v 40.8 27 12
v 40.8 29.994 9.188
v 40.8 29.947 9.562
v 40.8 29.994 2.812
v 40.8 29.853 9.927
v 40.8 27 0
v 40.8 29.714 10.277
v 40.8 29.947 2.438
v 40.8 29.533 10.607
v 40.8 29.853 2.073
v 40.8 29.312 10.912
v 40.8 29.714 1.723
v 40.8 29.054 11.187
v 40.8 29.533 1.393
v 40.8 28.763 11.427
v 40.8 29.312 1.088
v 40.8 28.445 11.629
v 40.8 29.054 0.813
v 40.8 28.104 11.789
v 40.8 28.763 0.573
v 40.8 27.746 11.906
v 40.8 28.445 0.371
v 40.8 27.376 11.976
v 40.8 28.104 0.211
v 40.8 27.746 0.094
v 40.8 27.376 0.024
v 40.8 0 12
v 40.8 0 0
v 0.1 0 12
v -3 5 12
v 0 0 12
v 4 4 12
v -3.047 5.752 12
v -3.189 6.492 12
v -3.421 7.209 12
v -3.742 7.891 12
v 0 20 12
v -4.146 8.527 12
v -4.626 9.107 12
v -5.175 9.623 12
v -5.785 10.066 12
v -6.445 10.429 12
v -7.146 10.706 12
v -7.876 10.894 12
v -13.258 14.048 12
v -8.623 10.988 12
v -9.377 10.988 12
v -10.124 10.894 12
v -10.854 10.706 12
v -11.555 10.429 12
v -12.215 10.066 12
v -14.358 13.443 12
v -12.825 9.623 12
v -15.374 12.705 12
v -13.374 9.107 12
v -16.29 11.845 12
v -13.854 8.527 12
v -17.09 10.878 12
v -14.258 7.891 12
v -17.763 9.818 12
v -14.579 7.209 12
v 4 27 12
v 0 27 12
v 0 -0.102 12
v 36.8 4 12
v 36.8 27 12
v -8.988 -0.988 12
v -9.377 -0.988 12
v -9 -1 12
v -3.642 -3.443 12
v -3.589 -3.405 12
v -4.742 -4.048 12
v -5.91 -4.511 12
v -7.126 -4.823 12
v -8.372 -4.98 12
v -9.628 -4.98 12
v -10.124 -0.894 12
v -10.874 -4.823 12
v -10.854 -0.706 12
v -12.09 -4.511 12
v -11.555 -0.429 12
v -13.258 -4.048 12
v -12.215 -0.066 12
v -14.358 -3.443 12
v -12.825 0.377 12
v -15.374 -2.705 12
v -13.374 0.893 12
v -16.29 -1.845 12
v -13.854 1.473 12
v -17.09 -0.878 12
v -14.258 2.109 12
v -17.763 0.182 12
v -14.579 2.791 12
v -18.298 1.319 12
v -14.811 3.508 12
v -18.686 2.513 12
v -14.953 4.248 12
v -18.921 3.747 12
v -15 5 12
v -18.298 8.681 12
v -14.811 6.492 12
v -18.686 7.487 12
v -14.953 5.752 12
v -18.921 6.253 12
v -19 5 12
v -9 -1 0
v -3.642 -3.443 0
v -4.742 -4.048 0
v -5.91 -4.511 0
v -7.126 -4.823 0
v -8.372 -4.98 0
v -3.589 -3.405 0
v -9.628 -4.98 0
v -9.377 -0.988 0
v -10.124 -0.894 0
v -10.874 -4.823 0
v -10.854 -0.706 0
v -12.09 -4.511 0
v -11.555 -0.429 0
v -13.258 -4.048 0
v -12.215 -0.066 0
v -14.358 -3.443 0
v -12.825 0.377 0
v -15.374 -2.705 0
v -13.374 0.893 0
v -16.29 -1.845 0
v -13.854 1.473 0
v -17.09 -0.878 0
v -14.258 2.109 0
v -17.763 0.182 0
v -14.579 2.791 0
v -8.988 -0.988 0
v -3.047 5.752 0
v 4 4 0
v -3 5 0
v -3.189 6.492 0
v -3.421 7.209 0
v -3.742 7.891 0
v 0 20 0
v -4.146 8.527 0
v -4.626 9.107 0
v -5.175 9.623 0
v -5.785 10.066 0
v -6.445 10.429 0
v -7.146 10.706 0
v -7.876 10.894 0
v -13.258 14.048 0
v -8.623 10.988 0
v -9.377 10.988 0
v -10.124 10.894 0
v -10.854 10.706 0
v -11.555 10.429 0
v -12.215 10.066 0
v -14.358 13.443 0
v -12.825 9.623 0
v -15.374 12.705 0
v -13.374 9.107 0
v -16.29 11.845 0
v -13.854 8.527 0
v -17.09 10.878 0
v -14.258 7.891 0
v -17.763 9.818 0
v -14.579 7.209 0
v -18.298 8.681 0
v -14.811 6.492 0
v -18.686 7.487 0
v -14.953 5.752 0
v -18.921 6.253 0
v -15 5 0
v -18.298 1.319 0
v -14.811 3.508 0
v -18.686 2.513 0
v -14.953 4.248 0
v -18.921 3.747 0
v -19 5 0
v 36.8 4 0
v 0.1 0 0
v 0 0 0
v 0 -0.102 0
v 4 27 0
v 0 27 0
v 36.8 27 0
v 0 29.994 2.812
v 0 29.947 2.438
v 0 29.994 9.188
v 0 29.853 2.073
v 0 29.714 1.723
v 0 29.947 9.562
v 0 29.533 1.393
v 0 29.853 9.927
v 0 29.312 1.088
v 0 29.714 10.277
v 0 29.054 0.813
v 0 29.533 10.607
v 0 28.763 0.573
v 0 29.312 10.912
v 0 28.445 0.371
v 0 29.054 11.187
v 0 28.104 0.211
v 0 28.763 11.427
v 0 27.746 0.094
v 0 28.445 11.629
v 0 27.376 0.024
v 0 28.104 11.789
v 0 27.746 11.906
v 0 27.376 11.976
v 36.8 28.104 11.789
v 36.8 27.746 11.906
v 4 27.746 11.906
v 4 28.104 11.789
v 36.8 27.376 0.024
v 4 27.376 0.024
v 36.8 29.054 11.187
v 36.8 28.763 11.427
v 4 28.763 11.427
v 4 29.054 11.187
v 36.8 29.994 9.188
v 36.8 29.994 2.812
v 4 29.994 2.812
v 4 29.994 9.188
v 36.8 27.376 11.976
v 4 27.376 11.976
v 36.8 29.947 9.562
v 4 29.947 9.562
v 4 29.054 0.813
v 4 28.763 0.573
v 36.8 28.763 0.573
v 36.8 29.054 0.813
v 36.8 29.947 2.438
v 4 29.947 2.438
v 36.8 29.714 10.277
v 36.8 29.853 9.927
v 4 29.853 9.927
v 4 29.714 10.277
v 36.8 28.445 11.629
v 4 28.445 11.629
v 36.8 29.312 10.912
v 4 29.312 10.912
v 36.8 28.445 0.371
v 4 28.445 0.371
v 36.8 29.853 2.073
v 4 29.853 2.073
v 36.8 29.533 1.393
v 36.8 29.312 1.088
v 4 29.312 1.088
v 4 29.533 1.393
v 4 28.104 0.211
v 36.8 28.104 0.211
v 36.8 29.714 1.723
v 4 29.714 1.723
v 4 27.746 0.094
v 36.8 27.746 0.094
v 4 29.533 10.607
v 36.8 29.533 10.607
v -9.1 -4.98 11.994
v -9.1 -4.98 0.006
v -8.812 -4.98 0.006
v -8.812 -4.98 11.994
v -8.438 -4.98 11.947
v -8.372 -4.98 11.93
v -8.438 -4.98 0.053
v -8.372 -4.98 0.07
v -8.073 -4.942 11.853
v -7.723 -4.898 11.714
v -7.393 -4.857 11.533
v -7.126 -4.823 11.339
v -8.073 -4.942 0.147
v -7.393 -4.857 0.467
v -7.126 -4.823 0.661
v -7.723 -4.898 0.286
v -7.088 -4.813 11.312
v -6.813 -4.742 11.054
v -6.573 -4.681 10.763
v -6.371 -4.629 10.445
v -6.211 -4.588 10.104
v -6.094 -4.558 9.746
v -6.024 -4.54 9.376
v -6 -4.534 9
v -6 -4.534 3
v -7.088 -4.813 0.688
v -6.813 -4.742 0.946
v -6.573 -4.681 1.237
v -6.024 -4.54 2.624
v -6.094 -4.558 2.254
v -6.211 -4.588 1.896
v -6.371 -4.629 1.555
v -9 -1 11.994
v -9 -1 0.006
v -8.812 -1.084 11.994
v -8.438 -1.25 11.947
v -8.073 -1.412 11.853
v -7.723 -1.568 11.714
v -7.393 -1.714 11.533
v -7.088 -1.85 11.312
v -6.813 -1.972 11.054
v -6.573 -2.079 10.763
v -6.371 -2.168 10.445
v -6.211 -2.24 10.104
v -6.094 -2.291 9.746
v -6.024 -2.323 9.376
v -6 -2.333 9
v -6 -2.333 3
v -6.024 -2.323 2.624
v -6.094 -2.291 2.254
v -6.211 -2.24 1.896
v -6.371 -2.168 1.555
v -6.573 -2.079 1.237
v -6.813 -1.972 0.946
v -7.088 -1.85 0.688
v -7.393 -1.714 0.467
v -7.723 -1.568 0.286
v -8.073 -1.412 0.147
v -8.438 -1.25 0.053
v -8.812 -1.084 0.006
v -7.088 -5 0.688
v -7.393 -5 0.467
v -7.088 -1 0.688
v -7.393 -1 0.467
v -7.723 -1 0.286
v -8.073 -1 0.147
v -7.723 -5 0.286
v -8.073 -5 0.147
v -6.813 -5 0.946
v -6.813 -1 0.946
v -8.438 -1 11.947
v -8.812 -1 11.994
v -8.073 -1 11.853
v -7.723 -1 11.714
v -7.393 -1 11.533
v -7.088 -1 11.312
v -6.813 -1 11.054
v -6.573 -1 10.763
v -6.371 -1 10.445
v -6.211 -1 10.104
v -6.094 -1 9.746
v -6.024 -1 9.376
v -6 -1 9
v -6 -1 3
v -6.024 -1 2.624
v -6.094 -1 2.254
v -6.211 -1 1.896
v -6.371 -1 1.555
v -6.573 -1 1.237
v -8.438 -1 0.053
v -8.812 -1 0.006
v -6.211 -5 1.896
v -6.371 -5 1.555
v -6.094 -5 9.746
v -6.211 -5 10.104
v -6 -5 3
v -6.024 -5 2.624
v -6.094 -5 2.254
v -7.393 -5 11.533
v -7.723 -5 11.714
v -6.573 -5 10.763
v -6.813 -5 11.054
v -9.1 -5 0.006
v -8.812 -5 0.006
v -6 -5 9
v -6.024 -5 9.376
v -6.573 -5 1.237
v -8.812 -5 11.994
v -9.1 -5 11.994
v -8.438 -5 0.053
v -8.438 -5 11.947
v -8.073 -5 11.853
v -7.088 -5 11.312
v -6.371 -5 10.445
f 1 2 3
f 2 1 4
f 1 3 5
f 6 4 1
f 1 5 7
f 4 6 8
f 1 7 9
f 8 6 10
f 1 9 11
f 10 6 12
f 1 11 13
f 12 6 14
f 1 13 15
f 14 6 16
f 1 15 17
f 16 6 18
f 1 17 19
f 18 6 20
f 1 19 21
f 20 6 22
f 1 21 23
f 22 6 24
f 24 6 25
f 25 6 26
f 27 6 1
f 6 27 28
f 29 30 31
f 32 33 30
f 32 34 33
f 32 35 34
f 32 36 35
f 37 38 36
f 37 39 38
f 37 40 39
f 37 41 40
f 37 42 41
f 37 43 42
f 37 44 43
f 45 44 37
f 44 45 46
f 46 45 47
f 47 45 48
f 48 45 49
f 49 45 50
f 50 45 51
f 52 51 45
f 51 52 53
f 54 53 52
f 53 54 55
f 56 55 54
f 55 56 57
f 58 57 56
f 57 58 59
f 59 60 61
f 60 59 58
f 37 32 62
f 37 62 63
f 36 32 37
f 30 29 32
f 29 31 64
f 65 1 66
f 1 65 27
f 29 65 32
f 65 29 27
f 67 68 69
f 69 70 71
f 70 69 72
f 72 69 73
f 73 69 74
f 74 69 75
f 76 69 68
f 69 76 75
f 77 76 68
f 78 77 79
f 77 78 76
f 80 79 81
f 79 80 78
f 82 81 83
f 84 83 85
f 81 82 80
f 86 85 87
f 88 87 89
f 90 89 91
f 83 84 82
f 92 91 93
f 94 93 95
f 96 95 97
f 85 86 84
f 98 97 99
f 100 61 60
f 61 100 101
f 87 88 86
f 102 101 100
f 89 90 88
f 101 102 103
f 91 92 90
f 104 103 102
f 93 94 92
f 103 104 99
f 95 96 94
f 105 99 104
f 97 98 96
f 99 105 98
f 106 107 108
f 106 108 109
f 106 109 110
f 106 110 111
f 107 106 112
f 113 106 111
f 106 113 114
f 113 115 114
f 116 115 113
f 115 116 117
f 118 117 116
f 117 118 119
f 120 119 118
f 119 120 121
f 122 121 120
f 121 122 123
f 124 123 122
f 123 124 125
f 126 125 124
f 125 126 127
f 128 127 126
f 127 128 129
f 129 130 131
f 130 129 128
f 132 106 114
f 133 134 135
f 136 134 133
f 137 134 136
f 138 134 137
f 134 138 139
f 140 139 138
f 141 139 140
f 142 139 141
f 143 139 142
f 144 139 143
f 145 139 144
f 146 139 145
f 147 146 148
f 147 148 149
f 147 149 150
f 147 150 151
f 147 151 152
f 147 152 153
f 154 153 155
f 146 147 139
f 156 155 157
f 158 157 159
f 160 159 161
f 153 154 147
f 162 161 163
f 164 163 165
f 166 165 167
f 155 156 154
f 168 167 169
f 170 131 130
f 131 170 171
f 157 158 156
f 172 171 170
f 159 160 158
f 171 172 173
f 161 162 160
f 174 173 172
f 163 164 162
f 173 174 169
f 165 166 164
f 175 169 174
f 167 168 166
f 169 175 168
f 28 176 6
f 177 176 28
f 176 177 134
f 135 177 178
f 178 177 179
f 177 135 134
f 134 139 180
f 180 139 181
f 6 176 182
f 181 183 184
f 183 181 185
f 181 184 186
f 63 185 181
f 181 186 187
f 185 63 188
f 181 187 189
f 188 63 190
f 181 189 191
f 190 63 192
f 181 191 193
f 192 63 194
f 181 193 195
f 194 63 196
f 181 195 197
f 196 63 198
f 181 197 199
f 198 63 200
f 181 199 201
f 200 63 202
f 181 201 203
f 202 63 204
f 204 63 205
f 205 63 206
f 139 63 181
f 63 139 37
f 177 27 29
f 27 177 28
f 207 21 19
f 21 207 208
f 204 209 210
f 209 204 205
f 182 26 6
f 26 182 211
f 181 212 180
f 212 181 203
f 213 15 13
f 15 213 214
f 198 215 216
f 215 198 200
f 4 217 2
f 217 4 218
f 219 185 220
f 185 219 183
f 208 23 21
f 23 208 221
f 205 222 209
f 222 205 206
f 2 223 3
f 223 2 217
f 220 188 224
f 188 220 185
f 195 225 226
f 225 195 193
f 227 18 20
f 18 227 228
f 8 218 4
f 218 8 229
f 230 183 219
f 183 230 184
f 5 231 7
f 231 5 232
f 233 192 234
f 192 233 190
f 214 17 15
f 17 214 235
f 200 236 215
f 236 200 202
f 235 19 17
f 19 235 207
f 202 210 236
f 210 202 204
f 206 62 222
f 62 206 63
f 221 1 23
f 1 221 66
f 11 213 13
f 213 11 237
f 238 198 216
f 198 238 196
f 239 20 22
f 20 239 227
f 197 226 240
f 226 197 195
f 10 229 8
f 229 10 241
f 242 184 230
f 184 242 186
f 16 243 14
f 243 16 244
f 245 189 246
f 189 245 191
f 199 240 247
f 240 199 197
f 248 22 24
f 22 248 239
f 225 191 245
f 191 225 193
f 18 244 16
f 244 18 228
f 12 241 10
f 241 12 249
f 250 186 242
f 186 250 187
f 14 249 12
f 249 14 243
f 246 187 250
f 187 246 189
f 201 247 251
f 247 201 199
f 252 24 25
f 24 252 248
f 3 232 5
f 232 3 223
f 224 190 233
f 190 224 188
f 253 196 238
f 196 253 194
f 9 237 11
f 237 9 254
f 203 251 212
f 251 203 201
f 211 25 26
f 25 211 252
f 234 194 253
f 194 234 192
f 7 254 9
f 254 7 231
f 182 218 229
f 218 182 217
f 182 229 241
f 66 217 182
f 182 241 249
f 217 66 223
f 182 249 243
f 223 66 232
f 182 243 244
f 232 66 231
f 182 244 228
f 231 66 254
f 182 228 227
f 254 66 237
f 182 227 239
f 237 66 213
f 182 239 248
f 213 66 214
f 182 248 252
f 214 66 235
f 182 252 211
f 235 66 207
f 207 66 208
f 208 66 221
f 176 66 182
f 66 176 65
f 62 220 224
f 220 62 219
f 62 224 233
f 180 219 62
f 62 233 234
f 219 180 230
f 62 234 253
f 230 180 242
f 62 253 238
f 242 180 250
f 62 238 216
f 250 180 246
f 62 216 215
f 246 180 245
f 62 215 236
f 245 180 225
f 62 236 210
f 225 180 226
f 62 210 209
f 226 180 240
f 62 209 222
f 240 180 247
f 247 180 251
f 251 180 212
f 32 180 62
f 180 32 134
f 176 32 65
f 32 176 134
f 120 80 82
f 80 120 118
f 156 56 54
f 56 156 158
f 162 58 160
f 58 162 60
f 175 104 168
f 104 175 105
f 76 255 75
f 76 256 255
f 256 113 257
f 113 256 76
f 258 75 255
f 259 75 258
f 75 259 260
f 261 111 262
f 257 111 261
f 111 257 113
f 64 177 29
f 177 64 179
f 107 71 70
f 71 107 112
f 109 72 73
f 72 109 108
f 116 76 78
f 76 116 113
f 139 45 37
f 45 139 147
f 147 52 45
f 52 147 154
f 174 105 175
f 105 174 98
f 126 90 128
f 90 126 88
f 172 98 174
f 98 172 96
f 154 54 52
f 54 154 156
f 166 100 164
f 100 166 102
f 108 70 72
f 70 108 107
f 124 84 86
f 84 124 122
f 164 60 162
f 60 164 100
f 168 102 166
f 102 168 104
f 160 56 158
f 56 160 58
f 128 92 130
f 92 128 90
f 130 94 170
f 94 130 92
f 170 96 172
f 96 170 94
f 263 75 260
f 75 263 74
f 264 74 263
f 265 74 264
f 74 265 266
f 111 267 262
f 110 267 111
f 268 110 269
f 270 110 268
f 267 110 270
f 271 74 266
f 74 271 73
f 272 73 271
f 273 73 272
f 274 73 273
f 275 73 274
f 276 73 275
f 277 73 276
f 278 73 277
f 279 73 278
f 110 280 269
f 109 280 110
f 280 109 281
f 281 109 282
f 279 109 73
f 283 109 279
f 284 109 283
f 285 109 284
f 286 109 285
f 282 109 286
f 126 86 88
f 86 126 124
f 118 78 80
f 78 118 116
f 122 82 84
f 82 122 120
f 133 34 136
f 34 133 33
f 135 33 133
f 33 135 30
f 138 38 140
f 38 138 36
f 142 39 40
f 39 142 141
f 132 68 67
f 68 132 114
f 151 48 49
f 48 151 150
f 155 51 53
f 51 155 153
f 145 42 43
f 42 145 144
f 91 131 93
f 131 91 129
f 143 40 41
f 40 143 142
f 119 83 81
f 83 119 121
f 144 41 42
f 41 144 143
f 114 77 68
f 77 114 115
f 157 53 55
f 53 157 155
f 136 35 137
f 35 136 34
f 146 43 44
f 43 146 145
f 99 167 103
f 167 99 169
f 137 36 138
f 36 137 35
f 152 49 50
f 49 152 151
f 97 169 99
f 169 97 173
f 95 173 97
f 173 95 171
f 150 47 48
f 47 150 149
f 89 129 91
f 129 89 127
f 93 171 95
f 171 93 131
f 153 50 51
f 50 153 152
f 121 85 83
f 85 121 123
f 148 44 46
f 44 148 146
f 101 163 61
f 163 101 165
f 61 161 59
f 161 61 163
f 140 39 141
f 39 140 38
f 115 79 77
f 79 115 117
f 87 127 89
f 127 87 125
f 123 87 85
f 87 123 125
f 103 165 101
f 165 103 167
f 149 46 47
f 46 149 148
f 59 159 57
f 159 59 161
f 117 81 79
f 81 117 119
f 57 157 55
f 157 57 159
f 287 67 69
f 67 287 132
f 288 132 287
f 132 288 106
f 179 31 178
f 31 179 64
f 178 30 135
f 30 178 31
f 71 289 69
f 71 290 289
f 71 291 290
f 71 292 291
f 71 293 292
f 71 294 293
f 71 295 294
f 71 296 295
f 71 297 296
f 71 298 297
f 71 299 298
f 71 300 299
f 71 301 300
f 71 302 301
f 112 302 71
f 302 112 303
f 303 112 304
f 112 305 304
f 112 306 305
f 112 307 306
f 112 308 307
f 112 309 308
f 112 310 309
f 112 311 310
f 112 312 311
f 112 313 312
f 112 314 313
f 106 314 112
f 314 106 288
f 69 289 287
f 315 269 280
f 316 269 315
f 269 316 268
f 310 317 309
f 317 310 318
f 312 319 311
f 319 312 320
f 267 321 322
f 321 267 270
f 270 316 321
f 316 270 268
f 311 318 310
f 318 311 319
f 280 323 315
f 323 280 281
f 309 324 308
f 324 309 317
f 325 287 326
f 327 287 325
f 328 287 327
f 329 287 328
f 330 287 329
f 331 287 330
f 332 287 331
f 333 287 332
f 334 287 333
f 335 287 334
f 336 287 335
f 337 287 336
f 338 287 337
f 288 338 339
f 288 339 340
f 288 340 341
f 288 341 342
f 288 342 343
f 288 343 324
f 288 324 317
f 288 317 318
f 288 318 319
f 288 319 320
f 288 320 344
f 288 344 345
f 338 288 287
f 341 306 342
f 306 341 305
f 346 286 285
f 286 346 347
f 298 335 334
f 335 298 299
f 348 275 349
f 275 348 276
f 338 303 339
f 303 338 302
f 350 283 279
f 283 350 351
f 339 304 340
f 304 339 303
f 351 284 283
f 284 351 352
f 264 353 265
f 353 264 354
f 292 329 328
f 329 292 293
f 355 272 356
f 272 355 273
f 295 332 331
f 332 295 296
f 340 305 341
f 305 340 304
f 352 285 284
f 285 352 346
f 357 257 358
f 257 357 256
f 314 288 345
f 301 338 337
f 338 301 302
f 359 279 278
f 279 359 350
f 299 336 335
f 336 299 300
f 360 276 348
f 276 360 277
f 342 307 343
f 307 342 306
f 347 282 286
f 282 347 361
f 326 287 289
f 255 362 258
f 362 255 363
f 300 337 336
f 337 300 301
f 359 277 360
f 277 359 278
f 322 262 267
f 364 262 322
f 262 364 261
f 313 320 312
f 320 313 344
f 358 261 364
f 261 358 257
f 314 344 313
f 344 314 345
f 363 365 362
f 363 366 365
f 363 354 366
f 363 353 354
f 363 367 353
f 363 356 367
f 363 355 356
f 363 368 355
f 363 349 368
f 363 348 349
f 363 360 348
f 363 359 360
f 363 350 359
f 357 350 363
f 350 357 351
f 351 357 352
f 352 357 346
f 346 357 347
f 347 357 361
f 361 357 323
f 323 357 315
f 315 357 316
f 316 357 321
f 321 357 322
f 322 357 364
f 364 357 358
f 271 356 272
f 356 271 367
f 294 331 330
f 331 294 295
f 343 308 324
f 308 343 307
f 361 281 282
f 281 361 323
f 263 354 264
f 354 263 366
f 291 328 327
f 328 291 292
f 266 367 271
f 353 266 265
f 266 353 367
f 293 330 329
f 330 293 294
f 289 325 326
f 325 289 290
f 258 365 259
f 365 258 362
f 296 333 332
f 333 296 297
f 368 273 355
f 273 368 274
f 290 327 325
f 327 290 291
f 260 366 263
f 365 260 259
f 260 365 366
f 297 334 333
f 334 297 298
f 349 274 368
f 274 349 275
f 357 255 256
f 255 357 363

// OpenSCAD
$fn = 50*1;
//Desk thikness
desk_thikness = 32.8;
//Clip width
clip_width = 12;


difference(){
	union(){	
		cube([desk_thikness+8,27,clip_width]);
		hull(){
			translate([0,27,3]) rotate ([0,90,0]) cylinder(desk_thikness+8,r=3);
			translate([0,27,clip_width-3]) rotate ([0,90,0]) cylinder(desk_thikness+8,r=3);
		}	
	}
		translate([4,4,0]) cube([desk_thikness,27,clip_width]);
}

difference() { 
	hull(){
			cube([0.1,20,clip_width]);
			translate([-9,5,clip_width/2]) cylinder(clip_width,r = 10,center = true);
		}
	translate([-9,5,0]) cylinder(clip_width,r = 6);
	linear_extrude(clip_width){
		translate([-9,5,0]) polygon([[9,-5],[6, 0],[0, -6],[0, -10],[0, -6],[9, -10]]);}

	
}
difference(){
	hull(){
		translate([-9,-1,clip_width-3]) rotate ([90,0,0]) cylinder(4,r=3);
		translate([-9,-1,3]) rotate ([90,0,0]) cylinder(4,r=3);
	}
	translate([-12,-1,0]) rotate ([90,0,0]) cube([2.9,clip_width,5]);
}
